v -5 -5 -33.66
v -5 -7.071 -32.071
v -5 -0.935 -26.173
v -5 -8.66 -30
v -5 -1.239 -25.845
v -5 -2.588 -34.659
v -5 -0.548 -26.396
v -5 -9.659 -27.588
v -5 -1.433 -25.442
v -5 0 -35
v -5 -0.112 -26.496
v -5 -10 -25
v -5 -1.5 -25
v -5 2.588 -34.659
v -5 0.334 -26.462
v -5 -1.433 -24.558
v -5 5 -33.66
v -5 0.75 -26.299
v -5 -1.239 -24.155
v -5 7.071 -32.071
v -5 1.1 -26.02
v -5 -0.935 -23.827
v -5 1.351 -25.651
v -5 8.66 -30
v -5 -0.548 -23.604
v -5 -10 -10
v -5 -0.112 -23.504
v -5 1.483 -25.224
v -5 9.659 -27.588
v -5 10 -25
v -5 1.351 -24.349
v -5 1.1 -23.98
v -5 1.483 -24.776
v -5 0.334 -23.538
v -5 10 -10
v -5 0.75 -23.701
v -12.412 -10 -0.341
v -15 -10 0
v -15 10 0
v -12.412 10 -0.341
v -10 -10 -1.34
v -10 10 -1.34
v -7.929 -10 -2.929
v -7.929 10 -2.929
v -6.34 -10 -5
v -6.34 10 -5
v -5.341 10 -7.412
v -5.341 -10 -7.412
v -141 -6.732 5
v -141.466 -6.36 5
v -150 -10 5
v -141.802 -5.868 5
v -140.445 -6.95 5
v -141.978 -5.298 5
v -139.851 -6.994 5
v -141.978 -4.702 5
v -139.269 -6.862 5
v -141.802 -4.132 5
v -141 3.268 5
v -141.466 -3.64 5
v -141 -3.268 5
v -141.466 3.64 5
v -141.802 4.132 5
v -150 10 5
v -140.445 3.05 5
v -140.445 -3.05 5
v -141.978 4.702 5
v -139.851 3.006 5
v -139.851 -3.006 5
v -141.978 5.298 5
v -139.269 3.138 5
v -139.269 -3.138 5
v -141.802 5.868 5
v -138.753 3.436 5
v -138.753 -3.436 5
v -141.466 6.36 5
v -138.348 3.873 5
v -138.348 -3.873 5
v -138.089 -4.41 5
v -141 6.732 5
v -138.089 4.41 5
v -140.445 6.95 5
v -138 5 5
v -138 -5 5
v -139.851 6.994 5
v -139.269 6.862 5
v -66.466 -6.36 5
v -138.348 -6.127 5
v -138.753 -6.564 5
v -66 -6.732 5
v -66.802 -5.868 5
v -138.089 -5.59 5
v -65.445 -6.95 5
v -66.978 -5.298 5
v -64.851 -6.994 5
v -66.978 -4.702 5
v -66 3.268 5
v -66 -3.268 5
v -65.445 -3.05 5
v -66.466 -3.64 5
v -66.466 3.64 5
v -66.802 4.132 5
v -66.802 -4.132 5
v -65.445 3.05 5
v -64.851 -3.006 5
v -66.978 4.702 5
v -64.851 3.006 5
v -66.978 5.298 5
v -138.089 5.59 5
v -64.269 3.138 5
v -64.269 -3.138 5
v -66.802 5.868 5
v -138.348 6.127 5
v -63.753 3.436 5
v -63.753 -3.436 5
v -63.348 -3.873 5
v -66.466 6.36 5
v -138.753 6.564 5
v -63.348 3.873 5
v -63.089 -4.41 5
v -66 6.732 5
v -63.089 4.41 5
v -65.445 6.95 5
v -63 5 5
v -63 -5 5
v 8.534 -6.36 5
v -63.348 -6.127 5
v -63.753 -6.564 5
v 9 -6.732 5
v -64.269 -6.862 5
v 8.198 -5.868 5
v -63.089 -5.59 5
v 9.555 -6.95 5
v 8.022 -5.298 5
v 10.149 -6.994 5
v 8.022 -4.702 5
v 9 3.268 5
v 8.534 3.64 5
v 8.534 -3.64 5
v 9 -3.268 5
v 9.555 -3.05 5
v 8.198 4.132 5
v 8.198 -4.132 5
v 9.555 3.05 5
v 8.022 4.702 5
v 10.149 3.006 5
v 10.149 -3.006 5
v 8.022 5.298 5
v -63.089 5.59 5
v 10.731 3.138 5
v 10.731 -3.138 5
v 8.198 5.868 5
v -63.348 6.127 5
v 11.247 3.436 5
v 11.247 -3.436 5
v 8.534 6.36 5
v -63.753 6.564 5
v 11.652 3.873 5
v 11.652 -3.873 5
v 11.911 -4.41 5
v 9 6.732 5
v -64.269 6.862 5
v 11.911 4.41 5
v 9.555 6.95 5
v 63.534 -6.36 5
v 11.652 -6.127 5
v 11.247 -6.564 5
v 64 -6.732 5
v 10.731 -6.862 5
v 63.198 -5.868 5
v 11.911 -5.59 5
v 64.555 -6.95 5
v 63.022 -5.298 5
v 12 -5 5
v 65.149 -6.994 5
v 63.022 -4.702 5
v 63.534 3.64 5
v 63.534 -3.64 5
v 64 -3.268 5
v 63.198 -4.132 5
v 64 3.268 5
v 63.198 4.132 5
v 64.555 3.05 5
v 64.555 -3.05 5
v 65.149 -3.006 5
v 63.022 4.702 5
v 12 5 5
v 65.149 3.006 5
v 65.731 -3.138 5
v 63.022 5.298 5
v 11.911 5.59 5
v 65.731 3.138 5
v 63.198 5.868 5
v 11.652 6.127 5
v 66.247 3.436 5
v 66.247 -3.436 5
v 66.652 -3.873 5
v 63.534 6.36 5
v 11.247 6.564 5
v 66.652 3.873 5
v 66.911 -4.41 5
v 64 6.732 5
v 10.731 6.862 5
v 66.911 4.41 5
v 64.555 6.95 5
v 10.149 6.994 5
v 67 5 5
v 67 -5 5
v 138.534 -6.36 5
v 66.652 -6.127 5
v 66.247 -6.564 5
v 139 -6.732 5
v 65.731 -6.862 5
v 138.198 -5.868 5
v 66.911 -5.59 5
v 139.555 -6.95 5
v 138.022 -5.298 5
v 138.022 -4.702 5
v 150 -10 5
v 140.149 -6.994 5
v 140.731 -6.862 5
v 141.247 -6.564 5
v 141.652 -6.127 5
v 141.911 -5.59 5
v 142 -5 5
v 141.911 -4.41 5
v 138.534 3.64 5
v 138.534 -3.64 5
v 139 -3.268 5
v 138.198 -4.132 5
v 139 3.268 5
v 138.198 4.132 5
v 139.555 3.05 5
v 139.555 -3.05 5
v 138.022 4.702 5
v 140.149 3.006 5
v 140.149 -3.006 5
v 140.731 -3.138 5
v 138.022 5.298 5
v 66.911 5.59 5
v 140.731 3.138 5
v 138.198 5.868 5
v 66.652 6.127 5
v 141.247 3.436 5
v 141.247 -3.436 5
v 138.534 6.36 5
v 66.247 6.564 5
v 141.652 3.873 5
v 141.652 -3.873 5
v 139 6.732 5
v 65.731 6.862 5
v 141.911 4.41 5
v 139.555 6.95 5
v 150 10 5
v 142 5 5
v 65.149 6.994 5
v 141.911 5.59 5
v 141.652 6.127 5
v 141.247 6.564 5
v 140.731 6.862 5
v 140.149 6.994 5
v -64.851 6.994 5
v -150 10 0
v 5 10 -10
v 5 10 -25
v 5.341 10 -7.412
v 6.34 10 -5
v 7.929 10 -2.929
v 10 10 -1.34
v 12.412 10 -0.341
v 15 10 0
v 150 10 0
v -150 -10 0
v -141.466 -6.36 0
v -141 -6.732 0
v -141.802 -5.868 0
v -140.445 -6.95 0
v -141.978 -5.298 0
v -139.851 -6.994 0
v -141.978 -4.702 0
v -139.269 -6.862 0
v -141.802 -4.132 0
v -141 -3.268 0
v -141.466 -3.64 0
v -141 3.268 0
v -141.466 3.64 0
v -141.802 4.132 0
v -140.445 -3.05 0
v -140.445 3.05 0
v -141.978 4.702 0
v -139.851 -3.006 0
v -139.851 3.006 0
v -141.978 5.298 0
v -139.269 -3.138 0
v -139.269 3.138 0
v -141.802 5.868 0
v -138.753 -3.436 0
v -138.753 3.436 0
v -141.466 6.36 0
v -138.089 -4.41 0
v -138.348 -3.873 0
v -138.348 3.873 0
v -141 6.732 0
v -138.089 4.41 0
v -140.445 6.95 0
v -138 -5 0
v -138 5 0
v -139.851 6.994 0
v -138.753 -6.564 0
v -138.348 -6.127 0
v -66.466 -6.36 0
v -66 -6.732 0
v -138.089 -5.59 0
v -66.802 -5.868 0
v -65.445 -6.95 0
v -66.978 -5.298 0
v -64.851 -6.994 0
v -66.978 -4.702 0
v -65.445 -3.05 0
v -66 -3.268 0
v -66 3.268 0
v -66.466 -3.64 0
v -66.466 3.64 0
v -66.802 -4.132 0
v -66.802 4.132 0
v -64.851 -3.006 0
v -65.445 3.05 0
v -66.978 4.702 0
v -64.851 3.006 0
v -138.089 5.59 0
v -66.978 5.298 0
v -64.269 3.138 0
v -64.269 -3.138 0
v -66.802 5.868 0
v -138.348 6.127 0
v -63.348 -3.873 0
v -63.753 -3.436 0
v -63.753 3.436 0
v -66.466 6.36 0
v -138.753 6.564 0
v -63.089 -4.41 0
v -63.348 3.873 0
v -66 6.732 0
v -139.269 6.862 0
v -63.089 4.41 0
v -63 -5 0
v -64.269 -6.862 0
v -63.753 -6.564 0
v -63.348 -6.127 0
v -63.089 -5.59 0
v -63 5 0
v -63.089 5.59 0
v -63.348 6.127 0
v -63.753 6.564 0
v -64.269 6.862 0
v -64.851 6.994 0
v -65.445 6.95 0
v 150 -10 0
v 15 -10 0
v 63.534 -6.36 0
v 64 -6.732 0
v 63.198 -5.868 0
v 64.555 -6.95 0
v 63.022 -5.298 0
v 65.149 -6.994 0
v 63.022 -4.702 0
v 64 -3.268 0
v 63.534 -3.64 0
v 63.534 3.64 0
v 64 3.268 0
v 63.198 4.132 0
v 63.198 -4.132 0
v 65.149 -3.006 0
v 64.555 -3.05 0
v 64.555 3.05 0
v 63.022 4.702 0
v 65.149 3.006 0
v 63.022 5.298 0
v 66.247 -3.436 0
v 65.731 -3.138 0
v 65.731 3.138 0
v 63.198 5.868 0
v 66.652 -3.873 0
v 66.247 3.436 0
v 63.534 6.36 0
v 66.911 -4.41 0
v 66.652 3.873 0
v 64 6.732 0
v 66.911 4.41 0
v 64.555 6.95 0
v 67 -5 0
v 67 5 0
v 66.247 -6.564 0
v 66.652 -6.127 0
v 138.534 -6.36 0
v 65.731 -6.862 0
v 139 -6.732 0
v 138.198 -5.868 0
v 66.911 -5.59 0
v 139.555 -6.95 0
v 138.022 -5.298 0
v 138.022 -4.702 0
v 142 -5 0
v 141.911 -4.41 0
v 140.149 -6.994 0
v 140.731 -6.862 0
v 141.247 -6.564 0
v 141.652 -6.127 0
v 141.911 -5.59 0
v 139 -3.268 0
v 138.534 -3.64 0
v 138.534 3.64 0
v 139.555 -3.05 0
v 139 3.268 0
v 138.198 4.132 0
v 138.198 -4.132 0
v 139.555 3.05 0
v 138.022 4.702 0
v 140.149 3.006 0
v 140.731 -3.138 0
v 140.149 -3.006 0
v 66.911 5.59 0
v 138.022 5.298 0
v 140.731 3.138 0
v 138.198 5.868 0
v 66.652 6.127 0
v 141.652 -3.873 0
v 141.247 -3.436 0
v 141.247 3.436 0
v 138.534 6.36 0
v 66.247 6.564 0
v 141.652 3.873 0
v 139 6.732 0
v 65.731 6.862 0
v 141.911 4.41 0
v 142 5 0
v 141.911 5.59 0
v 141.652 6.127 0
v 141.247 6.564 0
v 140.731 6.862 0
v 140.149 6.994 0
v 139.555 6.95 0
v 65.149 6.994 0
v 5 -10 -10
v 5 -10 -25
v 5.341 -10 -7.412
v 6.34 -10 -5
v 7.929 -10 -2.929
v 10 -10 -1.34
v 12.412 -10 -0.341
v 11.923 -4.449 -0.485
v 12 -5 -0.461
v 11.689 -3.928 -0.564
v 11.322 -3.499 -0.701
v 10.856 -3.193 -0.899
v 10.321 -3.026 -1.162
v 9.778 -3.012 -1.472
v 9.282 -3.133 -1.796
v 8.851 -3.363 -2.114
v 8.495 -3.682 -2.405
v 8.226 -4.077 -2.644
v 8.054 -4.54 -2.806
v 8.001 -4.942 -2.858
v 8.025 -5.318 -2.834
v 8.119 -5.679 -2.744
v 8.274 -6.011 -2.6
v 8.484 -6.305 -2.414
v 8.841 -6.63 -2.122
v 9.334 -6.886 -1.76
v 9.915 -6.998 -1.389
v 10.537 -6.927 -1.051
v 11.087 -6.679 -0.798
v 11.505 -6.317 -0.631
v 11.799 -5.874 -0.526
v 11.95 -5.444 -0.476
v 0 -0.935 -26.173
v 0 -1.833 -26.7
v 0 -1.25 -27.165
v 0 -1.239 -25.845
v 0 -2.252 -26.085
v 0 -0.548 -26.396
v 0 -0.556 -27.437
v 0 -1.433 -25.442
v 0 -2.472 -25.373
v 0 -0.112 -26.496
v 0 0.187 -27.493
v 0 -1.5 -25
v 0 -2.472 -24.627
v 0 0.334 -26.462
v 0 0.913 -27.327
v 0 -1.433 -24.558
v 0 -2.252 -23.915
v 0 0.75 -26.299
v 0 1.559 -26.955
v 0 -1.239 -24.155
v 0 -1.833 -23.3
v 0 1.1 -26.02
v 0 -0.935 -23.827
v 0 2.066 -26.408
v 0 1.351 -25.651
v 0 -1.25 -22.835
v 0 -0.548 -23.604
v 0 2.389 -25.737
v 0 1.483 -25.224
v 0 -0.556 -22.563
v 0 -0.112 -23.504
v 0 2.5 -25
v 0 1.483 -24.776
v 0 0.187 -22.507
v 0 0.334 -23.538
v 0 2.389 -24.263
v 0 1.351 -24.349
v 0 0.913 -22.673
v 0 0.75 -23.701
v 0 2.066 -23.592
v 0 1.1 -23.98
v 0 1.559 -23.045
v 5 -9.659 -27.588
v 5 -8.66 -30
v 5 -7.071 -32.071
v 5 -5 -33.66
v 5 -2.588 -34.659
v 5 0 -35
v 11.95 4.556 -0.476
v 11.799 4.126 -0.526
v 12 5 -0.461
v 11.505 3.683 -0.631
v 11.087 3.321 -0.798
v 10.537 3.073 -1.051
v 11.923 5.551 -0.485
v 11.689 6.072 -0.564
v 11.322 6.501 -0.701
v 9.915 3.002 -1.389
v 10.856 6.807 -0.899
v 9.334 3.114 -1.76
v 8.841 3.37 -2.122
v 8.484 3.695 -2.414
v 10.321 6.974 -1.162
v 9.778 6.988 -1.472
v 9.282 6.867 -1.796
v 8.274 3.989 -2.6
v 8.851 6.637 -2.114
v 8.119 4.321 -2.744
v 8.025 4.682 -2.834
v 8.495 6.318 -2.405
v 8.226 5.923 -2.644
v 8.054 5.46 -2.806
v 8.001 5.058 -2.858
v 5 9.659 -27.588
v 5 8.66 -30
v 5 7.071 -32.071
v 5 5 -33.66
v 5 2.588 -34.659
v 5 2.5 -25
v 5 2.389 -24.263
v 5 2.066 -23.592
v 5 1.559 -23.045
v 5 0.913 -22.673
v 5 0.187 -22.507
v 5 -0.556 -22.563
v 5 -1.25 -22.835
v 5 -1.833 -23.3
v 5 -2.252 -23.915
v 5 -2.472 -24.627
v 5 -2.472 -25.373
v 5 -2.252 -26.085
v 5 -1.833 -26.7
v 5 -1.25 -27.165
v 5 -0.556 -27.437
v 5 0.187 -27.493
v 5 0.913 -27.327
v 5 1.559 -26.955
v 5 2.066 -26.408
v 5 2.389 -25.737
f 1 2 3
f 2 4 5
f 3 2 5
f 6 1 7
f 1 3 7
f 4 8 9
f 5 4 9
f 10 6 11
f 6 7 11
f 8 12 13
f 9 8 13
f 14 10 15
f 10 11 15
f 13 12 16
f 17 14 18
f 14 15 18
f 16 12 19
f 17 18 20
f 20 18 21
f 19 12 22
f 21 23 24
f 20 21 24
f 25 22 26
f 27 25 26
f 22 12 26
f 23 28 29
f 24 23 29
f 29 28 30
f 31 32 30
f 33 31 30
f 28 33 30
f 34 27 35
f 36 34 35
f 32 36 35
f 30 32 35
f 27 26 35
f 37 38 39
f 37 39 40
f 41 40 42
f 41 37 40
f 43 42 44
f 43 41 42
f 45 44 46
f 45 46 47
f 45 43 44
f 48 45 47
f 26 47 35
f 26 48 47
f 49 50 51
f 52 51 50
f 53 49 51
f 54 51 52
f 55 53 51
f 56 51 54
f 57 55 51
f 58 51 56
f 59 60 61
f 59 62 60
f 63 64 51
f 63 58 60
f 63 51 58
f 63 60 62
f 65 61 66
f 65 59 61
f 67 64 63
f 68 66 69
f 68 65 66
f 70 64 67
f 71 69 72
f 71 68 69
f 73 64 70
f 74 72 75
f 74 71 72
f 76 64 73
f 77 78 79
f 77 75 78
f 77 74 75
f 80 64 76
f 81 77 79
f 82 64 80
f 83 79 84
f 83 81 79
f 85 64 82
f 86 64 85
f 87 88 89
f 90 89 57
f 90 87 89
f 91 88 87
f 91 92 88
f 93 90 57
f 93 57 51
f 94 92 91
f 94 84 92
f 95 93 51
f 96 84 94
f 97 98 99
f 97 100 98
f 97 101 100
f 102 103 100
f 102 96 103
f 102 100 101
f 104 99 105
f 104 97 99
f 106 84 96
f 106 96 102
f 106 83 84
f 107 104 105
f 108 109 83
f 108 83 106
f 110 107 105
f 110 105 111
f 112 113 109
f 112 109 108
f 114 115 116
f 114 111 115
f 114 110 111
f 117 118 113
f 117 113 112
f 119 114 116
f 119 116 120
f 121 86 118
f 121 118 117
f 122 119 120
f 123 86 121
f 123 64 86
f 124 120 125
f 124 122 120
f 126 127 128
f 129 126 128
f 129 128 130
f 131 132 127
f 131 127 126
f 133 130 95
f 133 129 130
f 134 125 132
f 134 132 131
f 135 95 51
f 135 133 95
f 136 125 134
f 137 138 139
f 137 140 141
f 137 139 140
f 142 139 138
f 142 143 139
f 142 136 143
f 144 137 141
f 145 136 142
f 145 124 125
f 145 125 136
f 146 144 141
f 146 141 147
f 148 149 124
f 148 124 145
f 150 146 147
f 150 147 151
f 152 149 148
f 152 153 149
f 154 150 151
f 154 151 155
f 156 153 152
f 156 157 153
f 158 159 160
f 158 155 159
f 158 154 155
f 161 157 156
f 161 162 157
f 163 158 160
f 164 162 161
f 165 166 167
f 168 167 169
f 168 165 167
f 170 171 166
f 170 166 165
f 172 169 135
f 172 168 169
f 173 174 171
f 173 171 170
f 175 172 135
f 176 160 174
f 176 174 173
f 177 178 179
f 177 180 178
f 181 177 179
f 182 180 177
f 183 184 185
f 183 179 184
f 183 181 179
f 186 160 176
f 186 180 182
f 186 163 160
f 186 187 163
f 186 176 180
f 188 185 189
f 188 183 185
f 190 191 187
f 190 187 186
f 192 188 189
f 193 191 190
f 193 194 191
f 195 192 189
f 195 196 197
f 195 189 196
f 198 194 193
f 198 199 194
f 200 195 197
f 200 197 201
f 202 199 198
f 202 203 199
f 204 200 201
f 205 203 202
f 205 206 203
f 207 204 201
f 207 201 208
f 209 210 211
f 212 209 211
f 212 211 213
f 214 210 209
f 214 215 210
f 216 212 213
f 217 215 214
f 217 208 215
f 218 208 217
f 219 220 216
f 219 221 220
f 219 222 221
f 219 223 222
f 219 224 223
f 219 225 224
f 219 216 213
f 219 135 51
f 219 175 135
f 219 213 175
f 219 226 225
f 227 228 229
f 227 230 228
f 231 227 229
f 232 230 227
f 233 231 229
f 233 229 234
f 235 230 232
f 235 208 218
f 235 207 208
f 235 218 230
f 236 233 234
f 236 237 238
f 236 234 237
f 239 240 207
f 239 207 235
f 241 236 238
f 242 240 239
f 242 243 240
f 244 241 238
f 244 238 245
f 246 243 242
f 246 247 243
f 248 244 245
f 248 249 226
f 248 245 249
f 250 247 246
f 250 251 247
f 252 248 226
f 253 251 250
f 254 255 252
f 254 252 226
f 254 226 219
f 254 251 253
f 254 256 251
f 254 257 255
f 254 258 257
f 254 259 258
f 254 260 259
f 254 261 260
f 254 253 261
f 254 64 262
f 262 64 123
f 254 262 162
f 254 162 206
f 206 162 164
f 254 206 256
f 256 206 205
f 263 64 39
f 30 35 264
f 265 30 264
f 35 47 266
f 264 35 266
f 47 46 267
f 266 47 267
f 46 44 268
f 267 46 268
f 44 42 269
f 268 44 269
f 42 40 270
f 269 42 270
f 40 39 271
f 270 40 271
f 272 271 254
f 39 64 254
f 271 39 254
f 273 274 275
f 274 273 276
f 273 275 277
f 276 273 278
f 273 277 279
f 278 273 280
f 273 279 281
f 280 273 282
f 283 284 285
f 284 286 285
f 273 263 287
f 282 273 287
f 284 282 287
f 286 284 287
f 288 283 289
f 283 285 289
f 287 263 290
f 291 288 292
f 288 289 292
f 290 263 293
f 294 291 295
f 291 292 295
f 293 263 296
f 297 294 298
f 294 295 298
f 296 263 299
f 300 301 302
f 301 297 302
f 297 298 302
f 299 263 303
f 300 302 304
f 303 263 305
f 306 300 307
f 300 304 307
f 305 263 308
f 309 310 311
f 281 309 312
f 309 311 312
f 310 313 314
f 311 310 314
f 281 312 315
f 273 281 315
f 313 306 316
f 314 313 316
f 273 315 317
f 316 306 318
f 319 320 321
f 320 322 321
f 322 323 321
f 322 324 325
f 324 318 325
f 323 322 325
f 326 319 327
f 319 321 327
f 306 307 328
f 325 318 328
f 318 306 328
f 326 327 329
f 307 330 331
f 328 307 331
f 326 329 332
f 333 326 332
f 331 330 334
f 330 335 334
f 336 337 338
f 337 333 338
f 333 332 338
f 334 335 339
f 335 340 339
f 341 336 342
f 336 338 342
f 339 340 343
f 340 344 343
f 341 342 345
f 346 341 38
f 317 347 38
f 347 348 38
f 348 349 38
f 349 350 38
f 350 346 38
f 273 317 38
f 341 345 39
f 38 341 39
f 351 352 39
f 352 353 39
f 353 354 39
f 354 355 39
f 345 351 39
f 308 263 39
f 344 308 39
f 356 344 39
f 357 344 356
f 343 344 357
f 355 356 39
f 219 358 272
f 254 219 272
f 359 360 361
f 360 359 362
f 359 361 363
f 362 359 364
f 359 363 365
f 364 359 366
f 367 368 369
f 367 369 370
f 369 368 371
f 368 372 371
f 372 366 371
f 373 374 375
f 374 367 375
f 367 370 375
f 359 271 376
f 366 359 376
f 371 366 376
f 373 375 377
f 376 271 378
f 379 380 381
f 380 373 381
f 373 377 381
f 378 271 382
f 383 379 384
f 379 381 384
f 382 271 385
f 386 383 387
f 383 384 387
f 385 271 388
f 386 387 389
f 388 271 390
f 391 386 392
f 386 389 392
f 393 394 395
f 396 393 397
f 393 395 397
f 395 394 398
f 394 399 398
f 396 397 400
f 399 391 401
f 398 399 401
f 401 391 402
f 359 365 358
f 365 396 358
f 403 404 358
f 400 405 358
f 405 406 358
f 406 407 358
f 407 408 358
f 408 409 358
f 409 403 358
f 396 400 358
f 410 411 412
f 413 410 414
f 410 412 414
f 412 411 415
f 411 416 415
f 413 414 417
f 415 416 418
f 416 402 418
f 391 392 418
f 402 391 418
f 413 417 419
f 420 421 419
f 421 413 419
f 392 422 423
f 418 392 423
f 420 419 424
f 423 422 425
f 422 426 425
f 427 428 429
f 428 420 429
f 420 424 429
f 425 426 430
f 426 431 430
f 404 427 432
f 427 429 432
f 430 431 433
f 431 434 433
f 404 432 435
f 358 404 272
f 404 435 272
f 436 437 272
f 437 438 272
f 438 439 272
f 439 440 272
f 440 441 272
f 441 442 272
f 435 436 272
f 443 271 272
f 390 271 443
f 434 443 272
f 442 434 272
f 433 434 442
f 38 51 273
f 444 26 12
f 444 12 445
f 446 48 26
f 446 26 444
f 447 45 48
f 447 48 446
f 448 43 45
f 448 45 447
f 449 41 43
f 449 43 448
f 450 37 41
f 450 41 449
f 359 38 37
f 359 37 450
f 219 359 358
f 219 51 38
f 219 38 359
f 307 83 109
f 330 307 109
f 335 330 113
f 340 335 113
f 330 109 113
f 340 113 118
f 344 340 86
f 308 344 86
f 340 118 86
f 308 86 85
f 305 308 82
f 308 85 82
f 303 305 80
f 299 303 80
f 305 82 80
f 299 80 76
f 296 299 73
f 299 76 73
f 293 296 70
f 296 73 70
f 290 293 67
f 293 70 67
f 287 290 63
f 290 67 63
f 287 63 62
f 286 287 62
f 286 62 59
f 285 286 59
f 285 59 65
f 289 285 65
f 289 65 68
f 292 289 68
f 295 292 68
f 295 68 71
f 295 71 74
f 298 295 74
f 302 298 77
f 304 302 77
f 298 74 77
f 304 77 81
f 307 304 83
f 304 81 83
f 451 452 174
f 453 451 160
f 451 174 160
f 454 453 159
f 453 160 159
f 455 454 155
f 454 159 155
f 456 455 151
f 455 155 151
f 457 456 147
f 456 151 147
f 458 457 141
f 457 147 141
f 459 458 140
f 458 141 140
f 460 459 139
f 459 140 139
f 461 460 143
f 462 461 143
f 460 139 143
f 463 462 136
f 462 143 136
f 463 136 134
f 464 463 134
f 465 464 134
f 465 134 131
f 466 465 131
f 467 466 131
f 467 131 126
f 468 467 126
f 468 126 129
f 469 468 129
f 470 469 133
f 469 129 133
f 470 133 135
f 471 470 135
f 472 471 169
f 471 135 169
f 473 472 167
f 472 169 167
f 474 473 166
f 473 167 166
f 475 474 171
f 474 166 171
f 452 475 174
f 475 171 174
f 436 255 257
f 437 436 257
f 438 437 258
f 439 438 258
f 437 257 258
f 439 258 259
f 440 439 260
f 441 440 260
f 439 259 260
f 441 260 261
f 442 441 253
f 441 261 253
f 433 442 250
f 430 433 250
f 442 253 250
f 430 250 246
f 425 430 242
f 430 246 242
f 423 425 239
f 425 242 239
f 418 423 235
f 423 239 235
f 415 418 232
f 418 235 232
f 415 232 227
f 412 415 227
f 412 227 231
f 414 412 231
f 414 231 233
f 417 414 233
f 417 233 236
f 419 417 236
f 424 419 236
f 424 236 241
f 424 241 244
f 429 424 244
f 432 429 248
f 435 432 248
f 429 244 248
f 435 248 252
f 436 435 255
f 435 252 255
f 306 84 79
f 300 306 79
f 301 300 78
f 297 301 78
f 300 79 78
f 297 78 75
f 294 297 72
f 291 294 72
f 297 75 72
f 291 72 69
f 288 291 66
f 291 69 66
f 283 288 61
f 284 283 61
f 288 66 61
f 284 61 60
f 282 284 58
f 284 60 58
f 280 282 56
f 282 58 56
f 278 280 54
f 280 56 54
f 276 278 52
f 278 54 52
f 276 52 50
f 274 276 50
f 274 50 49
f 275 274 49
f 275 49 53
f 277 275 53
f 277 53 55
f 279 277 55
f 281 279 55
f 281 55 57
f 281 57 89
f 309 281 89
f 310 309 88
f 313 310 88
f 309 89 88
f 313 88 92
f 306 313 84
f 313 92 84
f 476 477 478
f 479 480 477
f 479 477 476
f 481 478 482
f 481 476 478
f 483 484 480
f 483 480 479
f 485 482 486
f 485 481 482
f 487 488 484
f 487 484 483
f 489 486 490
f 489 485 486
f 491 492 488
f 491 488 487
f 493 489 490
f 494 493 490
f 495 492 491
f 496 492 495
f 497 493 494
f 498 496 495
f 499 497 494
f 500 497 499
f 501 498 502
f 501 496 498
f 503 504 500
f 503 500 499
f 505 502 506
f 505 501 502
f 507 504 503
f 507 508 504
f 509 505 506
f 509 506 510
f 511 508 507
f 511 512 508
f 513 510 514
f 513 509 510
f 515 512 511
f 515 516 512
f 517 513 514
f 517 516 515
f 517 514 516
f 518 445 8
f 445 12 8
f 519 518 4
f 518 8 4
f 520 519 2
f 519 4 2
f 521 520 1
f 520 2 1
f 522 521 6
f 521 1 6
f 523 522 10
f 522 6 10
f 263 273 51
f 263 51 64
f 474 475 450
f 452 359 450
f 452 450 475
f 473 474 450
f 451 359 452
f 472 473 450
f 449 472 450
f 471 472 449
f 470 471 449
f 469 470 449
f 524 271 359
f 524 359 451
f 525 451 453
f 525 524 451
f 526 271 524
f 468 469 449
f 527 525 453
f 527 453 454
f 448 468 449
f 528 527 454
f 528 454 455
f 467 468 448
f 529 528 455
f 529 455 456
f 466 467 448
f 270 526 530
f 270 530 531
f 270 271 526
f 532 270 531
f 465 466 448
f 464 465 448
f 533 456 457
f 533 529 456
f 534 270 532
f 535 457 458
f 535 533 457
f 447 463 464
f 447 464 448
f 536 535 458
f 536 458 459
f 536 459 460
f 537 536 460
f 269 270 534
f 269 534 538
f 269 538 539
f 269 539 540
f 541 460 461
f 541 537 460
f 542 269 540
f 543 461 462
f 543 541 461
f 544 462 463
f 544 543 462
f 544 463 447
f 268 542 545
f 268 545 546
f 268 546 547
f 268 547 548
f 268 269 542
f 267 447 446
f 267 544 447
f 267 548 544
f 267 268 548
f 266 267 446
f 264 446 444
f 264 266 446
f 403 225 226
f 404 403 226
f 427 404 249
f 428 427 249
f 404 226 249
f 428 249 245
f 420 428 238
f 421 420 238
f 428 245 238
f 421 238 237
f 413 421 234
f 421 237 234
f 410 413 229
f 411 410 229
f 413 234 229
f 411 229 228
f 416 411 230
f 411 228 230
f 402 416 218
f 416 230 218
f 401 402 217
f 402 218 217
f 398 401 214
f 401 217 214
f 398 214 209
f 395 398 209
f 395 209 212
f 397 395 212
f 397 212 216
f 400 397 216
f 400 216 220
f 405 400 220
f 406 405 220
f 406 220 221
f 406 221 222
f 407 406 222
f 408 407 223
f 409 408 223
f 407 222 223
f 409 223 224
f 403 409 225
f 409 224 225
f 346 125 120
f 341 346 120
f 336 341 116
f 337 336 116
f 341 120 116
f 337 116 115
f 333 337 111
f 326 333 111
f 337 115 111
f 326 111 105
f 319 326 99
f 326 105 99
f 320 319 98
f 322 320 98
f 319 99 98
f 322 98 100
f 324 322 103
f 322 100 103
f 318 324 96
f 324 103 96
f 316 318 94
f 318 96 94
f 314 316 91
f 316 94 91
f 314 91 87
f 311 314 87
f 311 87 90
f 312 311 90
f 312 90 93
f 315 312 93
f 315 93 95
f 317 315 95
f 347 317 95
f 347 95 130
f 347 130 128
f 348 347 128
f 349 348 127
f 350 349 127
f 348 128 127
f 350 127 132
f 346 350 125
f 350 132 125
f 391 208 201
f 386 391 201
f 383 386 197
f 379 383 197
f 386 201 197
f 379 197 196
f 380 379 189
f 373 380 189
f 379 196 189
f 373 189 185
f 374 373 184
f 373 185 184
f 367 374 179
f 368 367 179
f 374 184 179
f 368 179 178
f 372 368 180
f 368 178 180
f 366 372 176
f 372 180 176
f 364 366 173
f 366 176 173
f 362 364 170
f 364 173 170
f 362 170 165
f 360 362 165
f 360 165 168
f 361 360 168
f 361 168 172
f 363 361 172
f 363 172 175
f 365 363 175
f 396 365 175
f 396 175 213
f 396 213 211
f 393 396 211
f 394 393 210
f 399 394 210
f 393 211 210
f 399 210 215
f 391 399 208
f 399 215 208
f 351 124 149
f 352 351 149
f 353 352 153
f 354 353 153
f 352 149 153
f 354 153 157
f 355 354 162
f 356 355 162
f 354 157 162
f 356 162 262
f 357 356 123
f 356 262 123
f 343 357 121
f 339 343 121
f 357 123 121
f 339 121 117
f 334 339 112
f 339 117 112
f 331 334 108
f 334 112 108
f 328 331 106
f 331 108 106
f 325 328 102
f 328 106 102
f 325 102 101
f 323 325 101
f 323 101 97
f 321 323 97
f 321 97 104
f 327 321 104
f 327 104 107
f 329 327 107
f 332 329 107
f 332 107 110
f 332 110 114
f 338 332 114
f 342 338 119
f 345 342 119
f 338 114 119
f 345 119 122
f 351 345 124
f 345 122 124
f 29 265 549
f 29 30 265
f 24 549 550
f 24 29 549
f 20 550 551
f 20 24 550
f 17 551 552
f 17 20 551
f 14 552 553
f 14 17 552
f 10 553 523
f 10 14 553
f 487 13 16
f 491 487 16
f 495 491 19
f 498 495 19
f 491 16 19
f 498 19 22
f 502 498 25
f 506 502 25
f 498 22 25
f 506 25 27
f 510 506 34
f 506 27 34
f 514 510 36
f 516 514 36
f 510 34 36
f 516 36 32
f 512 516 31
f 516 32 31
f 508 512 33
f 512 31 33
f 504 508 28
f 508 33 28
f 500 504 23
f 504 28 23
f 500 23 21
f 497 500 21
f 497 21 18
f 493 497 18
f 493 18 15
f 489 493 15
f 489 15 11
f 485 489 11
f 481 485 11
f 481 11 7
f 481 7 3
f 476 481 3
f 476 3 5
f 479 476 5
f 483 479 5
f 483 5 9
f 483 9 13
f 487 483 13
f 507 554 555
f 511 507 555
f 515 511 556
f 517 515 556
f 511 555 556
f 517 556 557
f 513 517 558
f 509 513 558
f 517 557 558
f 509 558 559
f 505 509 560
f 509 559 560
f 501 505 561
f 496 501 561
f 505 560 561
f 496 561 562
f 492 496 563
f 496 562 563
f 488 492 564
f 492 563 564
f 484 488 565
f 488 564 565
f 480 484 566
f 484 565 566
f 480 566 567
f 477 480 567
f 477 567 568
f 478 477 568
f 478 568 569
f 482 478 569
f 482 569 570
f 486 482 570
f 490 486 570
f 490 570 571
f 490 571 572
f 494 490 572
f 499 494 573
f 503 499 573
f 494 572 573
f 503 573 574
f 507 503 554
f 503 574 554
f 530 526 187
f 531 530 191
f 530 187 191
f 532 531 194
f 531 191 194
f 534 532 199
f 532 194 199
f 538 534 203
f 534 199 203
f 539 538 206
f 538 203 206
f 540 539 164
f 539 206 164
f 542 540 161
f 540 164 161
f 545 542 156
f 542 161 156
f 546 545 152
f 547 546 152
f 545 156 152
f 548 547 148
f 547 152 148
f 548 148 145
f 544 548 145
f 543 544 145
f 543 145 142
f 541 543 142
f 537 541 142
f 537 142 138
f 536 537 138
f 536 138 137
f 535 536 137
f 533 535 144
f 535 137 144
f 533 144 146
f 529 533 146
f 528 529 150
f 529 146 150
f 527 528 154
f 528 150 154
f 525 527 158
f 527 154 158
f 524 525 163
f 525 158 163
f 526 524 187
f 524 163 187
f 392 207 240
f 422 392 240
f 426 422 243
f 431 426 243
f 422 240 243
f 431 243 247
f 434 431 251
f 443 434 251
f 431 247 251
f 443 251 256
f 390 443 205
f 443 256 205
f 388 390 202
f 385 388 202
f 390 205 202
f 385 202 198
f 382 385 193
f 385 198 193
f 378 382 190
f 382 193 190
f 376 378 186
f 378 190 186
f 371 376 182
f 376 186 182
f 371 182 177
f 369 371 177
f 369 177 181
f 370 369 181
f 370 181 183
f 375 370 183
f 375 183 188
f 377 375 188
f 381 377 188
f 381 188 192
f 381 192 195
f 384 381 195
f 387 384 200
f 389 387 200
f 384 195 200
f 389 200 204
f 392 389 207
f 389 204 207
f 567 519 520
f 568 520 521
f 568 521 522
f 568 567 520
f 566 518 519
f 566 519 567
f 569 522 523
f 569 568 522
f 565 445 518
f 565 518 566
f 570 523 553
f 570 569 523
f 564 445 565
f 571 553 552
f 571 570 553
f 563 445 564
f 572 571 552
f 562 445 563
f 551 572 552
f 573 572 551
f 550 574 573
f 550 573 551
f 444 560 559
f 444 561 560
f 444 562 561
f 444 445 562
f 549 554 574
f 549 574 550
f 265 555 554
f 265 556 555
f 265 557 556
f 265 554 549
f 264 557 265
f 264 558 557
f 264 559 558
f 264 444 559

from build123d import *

# Parameters (mm, degrees)
ESQUISSE1_W             = 300
ESQUISSE1_H             = 20
BOSS_EXTRU_1_DEPTH      = 5
ESQUISSE2_R             = 2
ENL_V_MAT_EXTRU_1_DEPTH = 5
ESQUISSE3_W             = 10
ESQUISSE3_H             = 20
BOSS_EXTRU_2_DEPTH      = 35
CONG_1_R                = 10
CONG_2_R                = 10
ESQUISSE4_R             = 1.5
ENL_V_MAT_EXTRU_2_DEPTH = 35
ESQUISSE6_R             = 2.5
ENL_V_MAT_EXTRU_3_DEPTH = 5


# Some blends are built 0.0001 mm under size
with BuildPart() as part:
    # Esquisse1 → Boss.-Extru.1 (new body)
    with BuildSketch(Plane.XY):
        Rectangle(ESQUISSE1_W, ESQUISSE1_H)
    extrude(amount=BOSS_EXTRU_1_DEPTH)

    # Esquisse2 → Enlèv. mat.-Extru.1 (cut)
    with BuildSketch(Plane.XY.offset(5)):
        with Locations((-140, 5)):
            Circle(ESQUISSE2_R)
        with Locations((-140, -5)):
            Circle(ESQUISSE2_R)
        with Locations((-65, 5)):
            Circle(ESQUISSE2_R)
        with Locations((-65, -5)):
            Circle(ESQUISSE2_R)
        with Locations((10, 5)):
            Circle(ESQUISSE2_R)
        with Locations((10, -5)):
            Circle(ESQUISSE2_R)
        with Locations((65, 5)):
            Circle(ESQUISSE2_R)
        with Locations((65, -5)):
            Circle(ESQUISSE2_R)
        with Locations((140, 5)):
            Circle(ESQUISSE2_R)
        with Locations((140, -5)):
            Circle(ESQUISSE2_R)
    extrude(amount=-ENL_V_MAT_EXTRU_1_DEPTH, mode=Mode.SUBTRACT)

    # Esquisse3 → Boss.-Extru.2 (add)
    with BuildSketch(Plane(origin=(0, 0, 0), x_dir=(-1, 0, 0), z_dir=(0, 0, -1))):
        Rectangle(ESQUISSE3_W, ESQUISSE3_H)
    extrude(amount=BOSS_EXTRU_2_DEPTH)

    # Congé1
    # the kernel refuses this fillet: 10 mm, written as the material it adds along each edge
    with BuildSketch(Plane(origin=(5, 10, 0), x_dir=(1, 0, 0), z_dir=(0, -1, 0))) as cong_1_piece_1_section:
        with BuildLine():
            CenterArc((CONG_1_R, -CONG_1_R), CONG_1_R, 90, 90)
            Line((0, -CONG_1_R), (0, 0))
            Line((0, 0), (CONG_1_R, 0))
        make_face()
    cong_1_piece_1 = extrude(amount=20, mode=Mode.PRIVATE)
    cong_1_piece_1 = cong_1_piece_1 - Plane(origin=(10, -5, -2.39791943), x_dir=(1, 0, 0), z_dir=(0, 0, 1)) * Cylinder(2, 80, mode=Mode.PRIVATE)
    cong_1_piece_1 = cong_1_piece_1 - Plane(origin=(10, 5, -2.39791943), x_dir=(1, 0, 0), z_dir=(0, 0, 1)) * Cylinder(2, 80, mode=Mode.PRIVATE)
    add(cong_1_piece_1)
    with BuildSketch(Plane(origin=(-5, -10, 0), x_dir=(-1, 0, 0), z_dir=(0, 1, 0))) as cong_1_piece_2:
        with BuildLine():
            CenterArc((CONG_1_R, -CONG_1_R), CONG_1_R, 90, 90)
            Line((0, -CONG_1_R), (0, 0))
            Line((0, 0), (CONG_1_R, 0))
        make_face()
    extrude(amount=20)

    # Congé2
    cong_2_edges = [part.edges().sort_by_distance(p)[0] for p in [
        (0, -10, -35),
        (0, 10, -35),
    ]]
    fillet(cong_2_edges, radius=CONG_2_R - 0.0001)  # a hair under: the kernel refuses the full size

    # Esquisse4 → Enlèv. mat.-Extru.2 (cut)
    with BuildSketch(Plane.ZY.offset(5)):
        with Locations(Location((-25, 0, 0), (0, 0, 270))):
            Circle(ESQUISSE4_R)
    extrude(amount=-ENL_V_MAT_EXTRU_2_DEPTH, mode=Mode.SUBTRACT)

    # Esquisse6 → Enlèv. mat.-Extru.3 (cut)
    with BuildSketch(Plane(origin=(5, 0, 0), x_dir=(0, 0, -1), z_dir=(1, 0, 0))):
        with Locations(Location((25, 0, 0), (0, 0, 90))):
            Circle(ESQUISSE6_R)
    extrude(amount=-ENL_V_MAT_EXTRU_3_DEPTH, mode=Mode.SUBTRACT)


solid = part.part
